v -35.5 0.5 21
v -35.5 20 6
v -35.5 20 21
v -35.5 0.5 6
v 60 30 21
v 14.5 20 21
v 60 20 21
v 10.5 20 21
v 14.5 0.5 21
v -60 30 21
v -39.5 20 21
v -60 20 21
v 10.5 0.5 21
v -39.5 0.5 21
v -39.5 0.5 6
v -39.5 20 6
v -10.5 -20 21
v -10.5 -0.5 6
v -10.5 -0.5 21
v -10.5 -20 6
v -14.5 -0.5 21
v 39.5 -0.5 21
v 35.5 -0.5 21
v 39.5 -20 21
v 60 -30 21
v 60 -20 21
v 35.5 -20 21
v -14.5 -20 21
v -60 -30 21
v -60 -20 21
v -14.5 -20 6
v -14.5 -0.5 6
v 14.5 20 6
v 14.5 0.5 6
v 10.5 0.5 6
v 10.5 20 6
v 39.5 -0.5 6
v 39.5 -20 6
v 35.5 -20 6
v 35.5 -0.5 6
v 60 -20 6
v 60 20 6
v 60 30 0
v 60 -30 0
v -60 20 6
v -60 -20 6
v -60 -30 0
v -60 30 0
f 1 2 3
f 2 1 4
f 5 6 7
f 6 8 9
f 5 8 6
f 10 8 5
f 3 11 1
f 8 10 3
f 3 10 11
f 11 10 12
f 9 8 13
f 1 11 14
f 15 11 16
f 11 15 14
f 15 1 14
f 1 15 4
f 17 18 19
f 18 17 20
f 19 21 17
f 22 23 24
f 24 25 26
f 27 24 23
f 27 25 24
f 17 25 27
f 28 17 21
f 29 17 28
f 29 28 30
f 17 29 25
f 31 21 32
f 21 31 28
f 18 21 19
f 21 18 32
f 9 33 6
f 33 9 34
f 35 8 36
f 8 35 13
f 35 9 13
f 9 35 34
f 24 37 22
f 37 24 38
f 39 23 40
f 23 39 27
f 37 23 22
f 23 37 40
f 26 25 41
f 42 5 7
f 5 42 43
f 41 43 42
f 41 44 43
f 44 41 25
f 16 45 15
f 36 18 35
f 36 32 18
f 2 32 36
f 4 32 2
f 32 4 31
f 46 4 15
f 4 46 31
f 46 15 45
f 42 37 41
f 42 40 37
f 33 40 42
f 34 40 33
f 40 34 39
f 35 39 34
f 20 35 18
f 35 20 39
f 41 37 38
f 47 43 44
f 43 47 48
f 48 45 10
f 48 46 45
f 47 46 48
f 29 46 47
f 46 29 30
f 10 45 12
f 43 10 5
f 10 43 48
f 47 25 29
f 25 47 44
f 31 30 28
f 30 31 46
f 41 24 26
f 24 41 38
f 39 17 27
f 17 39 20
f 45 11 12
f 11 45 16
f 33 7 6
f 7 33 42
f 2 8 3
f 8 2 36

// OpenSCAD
$fn = 32;

// ----------------------------------------------------------------------
// Rib frame 120 x 60 x 21
// 4 ribs at 25 mm pitch, staggered
// ----------------------------------------------------------------------

// --- parameters (mm) ---
frame = [120, 60, 6];  // base plate size (x, y, z)
rail_w = 10;           // side rail width
ribs = 4;              // number of ribs
rib_t = 4;             // rib thickness
rib_h = 15;            // rib height above the base plate
pitch = 25;            // pitch between rib centres

// --- derived feature positions (mm) ---
span = (ribs - 1) * pitch;          // = 75   distance between the outer ribs
origin_x = -span / 2;               // = -37.5   X of the first rib
rib_len = frame[1] / 2 - rail_w + 0.5;  // = 20.5   length of a staggered rib
rib_y = 0.5 + rib_len / 2;          // = 10.75   Y of a staggered rib centre
row_offset = 2 * rib_y;             // = 21.5   distance between the two rows
feature_centers = [
  [origin_x + 0 * pitch, rib_y],
  [origin_x + 1 * pitch, -rib_y],
  [origin_x + 2 * pitch, rib_y],
  [origin_x + 3 * pitch, -rib_y]
];   // rib centre line, drives the rib loop

// base plate, two side rails, then the ribs read straight off feature_centers
union() {
  translate([-frame[0] / 2, -frame[1] / 2, 0]) cube(frame);
  translate([-frame[0] / 2, -frame[1] / 2, 0]) cube([frame[0], rail_w, frame[2] + rib_h]);
  translate([-frame[0] / 2, frame[1] / 2 - rail_w, 0]) cube([frame[0], rail_w, frame[2] + rib_h]);
  for (centre = feature_centers)
    translate([centre[0] - rib_t / 2, centre[1] - rib_len / 2, frame[2] - 1])
      cube([rib_t, rib_len, rib_h + 1]);
}
